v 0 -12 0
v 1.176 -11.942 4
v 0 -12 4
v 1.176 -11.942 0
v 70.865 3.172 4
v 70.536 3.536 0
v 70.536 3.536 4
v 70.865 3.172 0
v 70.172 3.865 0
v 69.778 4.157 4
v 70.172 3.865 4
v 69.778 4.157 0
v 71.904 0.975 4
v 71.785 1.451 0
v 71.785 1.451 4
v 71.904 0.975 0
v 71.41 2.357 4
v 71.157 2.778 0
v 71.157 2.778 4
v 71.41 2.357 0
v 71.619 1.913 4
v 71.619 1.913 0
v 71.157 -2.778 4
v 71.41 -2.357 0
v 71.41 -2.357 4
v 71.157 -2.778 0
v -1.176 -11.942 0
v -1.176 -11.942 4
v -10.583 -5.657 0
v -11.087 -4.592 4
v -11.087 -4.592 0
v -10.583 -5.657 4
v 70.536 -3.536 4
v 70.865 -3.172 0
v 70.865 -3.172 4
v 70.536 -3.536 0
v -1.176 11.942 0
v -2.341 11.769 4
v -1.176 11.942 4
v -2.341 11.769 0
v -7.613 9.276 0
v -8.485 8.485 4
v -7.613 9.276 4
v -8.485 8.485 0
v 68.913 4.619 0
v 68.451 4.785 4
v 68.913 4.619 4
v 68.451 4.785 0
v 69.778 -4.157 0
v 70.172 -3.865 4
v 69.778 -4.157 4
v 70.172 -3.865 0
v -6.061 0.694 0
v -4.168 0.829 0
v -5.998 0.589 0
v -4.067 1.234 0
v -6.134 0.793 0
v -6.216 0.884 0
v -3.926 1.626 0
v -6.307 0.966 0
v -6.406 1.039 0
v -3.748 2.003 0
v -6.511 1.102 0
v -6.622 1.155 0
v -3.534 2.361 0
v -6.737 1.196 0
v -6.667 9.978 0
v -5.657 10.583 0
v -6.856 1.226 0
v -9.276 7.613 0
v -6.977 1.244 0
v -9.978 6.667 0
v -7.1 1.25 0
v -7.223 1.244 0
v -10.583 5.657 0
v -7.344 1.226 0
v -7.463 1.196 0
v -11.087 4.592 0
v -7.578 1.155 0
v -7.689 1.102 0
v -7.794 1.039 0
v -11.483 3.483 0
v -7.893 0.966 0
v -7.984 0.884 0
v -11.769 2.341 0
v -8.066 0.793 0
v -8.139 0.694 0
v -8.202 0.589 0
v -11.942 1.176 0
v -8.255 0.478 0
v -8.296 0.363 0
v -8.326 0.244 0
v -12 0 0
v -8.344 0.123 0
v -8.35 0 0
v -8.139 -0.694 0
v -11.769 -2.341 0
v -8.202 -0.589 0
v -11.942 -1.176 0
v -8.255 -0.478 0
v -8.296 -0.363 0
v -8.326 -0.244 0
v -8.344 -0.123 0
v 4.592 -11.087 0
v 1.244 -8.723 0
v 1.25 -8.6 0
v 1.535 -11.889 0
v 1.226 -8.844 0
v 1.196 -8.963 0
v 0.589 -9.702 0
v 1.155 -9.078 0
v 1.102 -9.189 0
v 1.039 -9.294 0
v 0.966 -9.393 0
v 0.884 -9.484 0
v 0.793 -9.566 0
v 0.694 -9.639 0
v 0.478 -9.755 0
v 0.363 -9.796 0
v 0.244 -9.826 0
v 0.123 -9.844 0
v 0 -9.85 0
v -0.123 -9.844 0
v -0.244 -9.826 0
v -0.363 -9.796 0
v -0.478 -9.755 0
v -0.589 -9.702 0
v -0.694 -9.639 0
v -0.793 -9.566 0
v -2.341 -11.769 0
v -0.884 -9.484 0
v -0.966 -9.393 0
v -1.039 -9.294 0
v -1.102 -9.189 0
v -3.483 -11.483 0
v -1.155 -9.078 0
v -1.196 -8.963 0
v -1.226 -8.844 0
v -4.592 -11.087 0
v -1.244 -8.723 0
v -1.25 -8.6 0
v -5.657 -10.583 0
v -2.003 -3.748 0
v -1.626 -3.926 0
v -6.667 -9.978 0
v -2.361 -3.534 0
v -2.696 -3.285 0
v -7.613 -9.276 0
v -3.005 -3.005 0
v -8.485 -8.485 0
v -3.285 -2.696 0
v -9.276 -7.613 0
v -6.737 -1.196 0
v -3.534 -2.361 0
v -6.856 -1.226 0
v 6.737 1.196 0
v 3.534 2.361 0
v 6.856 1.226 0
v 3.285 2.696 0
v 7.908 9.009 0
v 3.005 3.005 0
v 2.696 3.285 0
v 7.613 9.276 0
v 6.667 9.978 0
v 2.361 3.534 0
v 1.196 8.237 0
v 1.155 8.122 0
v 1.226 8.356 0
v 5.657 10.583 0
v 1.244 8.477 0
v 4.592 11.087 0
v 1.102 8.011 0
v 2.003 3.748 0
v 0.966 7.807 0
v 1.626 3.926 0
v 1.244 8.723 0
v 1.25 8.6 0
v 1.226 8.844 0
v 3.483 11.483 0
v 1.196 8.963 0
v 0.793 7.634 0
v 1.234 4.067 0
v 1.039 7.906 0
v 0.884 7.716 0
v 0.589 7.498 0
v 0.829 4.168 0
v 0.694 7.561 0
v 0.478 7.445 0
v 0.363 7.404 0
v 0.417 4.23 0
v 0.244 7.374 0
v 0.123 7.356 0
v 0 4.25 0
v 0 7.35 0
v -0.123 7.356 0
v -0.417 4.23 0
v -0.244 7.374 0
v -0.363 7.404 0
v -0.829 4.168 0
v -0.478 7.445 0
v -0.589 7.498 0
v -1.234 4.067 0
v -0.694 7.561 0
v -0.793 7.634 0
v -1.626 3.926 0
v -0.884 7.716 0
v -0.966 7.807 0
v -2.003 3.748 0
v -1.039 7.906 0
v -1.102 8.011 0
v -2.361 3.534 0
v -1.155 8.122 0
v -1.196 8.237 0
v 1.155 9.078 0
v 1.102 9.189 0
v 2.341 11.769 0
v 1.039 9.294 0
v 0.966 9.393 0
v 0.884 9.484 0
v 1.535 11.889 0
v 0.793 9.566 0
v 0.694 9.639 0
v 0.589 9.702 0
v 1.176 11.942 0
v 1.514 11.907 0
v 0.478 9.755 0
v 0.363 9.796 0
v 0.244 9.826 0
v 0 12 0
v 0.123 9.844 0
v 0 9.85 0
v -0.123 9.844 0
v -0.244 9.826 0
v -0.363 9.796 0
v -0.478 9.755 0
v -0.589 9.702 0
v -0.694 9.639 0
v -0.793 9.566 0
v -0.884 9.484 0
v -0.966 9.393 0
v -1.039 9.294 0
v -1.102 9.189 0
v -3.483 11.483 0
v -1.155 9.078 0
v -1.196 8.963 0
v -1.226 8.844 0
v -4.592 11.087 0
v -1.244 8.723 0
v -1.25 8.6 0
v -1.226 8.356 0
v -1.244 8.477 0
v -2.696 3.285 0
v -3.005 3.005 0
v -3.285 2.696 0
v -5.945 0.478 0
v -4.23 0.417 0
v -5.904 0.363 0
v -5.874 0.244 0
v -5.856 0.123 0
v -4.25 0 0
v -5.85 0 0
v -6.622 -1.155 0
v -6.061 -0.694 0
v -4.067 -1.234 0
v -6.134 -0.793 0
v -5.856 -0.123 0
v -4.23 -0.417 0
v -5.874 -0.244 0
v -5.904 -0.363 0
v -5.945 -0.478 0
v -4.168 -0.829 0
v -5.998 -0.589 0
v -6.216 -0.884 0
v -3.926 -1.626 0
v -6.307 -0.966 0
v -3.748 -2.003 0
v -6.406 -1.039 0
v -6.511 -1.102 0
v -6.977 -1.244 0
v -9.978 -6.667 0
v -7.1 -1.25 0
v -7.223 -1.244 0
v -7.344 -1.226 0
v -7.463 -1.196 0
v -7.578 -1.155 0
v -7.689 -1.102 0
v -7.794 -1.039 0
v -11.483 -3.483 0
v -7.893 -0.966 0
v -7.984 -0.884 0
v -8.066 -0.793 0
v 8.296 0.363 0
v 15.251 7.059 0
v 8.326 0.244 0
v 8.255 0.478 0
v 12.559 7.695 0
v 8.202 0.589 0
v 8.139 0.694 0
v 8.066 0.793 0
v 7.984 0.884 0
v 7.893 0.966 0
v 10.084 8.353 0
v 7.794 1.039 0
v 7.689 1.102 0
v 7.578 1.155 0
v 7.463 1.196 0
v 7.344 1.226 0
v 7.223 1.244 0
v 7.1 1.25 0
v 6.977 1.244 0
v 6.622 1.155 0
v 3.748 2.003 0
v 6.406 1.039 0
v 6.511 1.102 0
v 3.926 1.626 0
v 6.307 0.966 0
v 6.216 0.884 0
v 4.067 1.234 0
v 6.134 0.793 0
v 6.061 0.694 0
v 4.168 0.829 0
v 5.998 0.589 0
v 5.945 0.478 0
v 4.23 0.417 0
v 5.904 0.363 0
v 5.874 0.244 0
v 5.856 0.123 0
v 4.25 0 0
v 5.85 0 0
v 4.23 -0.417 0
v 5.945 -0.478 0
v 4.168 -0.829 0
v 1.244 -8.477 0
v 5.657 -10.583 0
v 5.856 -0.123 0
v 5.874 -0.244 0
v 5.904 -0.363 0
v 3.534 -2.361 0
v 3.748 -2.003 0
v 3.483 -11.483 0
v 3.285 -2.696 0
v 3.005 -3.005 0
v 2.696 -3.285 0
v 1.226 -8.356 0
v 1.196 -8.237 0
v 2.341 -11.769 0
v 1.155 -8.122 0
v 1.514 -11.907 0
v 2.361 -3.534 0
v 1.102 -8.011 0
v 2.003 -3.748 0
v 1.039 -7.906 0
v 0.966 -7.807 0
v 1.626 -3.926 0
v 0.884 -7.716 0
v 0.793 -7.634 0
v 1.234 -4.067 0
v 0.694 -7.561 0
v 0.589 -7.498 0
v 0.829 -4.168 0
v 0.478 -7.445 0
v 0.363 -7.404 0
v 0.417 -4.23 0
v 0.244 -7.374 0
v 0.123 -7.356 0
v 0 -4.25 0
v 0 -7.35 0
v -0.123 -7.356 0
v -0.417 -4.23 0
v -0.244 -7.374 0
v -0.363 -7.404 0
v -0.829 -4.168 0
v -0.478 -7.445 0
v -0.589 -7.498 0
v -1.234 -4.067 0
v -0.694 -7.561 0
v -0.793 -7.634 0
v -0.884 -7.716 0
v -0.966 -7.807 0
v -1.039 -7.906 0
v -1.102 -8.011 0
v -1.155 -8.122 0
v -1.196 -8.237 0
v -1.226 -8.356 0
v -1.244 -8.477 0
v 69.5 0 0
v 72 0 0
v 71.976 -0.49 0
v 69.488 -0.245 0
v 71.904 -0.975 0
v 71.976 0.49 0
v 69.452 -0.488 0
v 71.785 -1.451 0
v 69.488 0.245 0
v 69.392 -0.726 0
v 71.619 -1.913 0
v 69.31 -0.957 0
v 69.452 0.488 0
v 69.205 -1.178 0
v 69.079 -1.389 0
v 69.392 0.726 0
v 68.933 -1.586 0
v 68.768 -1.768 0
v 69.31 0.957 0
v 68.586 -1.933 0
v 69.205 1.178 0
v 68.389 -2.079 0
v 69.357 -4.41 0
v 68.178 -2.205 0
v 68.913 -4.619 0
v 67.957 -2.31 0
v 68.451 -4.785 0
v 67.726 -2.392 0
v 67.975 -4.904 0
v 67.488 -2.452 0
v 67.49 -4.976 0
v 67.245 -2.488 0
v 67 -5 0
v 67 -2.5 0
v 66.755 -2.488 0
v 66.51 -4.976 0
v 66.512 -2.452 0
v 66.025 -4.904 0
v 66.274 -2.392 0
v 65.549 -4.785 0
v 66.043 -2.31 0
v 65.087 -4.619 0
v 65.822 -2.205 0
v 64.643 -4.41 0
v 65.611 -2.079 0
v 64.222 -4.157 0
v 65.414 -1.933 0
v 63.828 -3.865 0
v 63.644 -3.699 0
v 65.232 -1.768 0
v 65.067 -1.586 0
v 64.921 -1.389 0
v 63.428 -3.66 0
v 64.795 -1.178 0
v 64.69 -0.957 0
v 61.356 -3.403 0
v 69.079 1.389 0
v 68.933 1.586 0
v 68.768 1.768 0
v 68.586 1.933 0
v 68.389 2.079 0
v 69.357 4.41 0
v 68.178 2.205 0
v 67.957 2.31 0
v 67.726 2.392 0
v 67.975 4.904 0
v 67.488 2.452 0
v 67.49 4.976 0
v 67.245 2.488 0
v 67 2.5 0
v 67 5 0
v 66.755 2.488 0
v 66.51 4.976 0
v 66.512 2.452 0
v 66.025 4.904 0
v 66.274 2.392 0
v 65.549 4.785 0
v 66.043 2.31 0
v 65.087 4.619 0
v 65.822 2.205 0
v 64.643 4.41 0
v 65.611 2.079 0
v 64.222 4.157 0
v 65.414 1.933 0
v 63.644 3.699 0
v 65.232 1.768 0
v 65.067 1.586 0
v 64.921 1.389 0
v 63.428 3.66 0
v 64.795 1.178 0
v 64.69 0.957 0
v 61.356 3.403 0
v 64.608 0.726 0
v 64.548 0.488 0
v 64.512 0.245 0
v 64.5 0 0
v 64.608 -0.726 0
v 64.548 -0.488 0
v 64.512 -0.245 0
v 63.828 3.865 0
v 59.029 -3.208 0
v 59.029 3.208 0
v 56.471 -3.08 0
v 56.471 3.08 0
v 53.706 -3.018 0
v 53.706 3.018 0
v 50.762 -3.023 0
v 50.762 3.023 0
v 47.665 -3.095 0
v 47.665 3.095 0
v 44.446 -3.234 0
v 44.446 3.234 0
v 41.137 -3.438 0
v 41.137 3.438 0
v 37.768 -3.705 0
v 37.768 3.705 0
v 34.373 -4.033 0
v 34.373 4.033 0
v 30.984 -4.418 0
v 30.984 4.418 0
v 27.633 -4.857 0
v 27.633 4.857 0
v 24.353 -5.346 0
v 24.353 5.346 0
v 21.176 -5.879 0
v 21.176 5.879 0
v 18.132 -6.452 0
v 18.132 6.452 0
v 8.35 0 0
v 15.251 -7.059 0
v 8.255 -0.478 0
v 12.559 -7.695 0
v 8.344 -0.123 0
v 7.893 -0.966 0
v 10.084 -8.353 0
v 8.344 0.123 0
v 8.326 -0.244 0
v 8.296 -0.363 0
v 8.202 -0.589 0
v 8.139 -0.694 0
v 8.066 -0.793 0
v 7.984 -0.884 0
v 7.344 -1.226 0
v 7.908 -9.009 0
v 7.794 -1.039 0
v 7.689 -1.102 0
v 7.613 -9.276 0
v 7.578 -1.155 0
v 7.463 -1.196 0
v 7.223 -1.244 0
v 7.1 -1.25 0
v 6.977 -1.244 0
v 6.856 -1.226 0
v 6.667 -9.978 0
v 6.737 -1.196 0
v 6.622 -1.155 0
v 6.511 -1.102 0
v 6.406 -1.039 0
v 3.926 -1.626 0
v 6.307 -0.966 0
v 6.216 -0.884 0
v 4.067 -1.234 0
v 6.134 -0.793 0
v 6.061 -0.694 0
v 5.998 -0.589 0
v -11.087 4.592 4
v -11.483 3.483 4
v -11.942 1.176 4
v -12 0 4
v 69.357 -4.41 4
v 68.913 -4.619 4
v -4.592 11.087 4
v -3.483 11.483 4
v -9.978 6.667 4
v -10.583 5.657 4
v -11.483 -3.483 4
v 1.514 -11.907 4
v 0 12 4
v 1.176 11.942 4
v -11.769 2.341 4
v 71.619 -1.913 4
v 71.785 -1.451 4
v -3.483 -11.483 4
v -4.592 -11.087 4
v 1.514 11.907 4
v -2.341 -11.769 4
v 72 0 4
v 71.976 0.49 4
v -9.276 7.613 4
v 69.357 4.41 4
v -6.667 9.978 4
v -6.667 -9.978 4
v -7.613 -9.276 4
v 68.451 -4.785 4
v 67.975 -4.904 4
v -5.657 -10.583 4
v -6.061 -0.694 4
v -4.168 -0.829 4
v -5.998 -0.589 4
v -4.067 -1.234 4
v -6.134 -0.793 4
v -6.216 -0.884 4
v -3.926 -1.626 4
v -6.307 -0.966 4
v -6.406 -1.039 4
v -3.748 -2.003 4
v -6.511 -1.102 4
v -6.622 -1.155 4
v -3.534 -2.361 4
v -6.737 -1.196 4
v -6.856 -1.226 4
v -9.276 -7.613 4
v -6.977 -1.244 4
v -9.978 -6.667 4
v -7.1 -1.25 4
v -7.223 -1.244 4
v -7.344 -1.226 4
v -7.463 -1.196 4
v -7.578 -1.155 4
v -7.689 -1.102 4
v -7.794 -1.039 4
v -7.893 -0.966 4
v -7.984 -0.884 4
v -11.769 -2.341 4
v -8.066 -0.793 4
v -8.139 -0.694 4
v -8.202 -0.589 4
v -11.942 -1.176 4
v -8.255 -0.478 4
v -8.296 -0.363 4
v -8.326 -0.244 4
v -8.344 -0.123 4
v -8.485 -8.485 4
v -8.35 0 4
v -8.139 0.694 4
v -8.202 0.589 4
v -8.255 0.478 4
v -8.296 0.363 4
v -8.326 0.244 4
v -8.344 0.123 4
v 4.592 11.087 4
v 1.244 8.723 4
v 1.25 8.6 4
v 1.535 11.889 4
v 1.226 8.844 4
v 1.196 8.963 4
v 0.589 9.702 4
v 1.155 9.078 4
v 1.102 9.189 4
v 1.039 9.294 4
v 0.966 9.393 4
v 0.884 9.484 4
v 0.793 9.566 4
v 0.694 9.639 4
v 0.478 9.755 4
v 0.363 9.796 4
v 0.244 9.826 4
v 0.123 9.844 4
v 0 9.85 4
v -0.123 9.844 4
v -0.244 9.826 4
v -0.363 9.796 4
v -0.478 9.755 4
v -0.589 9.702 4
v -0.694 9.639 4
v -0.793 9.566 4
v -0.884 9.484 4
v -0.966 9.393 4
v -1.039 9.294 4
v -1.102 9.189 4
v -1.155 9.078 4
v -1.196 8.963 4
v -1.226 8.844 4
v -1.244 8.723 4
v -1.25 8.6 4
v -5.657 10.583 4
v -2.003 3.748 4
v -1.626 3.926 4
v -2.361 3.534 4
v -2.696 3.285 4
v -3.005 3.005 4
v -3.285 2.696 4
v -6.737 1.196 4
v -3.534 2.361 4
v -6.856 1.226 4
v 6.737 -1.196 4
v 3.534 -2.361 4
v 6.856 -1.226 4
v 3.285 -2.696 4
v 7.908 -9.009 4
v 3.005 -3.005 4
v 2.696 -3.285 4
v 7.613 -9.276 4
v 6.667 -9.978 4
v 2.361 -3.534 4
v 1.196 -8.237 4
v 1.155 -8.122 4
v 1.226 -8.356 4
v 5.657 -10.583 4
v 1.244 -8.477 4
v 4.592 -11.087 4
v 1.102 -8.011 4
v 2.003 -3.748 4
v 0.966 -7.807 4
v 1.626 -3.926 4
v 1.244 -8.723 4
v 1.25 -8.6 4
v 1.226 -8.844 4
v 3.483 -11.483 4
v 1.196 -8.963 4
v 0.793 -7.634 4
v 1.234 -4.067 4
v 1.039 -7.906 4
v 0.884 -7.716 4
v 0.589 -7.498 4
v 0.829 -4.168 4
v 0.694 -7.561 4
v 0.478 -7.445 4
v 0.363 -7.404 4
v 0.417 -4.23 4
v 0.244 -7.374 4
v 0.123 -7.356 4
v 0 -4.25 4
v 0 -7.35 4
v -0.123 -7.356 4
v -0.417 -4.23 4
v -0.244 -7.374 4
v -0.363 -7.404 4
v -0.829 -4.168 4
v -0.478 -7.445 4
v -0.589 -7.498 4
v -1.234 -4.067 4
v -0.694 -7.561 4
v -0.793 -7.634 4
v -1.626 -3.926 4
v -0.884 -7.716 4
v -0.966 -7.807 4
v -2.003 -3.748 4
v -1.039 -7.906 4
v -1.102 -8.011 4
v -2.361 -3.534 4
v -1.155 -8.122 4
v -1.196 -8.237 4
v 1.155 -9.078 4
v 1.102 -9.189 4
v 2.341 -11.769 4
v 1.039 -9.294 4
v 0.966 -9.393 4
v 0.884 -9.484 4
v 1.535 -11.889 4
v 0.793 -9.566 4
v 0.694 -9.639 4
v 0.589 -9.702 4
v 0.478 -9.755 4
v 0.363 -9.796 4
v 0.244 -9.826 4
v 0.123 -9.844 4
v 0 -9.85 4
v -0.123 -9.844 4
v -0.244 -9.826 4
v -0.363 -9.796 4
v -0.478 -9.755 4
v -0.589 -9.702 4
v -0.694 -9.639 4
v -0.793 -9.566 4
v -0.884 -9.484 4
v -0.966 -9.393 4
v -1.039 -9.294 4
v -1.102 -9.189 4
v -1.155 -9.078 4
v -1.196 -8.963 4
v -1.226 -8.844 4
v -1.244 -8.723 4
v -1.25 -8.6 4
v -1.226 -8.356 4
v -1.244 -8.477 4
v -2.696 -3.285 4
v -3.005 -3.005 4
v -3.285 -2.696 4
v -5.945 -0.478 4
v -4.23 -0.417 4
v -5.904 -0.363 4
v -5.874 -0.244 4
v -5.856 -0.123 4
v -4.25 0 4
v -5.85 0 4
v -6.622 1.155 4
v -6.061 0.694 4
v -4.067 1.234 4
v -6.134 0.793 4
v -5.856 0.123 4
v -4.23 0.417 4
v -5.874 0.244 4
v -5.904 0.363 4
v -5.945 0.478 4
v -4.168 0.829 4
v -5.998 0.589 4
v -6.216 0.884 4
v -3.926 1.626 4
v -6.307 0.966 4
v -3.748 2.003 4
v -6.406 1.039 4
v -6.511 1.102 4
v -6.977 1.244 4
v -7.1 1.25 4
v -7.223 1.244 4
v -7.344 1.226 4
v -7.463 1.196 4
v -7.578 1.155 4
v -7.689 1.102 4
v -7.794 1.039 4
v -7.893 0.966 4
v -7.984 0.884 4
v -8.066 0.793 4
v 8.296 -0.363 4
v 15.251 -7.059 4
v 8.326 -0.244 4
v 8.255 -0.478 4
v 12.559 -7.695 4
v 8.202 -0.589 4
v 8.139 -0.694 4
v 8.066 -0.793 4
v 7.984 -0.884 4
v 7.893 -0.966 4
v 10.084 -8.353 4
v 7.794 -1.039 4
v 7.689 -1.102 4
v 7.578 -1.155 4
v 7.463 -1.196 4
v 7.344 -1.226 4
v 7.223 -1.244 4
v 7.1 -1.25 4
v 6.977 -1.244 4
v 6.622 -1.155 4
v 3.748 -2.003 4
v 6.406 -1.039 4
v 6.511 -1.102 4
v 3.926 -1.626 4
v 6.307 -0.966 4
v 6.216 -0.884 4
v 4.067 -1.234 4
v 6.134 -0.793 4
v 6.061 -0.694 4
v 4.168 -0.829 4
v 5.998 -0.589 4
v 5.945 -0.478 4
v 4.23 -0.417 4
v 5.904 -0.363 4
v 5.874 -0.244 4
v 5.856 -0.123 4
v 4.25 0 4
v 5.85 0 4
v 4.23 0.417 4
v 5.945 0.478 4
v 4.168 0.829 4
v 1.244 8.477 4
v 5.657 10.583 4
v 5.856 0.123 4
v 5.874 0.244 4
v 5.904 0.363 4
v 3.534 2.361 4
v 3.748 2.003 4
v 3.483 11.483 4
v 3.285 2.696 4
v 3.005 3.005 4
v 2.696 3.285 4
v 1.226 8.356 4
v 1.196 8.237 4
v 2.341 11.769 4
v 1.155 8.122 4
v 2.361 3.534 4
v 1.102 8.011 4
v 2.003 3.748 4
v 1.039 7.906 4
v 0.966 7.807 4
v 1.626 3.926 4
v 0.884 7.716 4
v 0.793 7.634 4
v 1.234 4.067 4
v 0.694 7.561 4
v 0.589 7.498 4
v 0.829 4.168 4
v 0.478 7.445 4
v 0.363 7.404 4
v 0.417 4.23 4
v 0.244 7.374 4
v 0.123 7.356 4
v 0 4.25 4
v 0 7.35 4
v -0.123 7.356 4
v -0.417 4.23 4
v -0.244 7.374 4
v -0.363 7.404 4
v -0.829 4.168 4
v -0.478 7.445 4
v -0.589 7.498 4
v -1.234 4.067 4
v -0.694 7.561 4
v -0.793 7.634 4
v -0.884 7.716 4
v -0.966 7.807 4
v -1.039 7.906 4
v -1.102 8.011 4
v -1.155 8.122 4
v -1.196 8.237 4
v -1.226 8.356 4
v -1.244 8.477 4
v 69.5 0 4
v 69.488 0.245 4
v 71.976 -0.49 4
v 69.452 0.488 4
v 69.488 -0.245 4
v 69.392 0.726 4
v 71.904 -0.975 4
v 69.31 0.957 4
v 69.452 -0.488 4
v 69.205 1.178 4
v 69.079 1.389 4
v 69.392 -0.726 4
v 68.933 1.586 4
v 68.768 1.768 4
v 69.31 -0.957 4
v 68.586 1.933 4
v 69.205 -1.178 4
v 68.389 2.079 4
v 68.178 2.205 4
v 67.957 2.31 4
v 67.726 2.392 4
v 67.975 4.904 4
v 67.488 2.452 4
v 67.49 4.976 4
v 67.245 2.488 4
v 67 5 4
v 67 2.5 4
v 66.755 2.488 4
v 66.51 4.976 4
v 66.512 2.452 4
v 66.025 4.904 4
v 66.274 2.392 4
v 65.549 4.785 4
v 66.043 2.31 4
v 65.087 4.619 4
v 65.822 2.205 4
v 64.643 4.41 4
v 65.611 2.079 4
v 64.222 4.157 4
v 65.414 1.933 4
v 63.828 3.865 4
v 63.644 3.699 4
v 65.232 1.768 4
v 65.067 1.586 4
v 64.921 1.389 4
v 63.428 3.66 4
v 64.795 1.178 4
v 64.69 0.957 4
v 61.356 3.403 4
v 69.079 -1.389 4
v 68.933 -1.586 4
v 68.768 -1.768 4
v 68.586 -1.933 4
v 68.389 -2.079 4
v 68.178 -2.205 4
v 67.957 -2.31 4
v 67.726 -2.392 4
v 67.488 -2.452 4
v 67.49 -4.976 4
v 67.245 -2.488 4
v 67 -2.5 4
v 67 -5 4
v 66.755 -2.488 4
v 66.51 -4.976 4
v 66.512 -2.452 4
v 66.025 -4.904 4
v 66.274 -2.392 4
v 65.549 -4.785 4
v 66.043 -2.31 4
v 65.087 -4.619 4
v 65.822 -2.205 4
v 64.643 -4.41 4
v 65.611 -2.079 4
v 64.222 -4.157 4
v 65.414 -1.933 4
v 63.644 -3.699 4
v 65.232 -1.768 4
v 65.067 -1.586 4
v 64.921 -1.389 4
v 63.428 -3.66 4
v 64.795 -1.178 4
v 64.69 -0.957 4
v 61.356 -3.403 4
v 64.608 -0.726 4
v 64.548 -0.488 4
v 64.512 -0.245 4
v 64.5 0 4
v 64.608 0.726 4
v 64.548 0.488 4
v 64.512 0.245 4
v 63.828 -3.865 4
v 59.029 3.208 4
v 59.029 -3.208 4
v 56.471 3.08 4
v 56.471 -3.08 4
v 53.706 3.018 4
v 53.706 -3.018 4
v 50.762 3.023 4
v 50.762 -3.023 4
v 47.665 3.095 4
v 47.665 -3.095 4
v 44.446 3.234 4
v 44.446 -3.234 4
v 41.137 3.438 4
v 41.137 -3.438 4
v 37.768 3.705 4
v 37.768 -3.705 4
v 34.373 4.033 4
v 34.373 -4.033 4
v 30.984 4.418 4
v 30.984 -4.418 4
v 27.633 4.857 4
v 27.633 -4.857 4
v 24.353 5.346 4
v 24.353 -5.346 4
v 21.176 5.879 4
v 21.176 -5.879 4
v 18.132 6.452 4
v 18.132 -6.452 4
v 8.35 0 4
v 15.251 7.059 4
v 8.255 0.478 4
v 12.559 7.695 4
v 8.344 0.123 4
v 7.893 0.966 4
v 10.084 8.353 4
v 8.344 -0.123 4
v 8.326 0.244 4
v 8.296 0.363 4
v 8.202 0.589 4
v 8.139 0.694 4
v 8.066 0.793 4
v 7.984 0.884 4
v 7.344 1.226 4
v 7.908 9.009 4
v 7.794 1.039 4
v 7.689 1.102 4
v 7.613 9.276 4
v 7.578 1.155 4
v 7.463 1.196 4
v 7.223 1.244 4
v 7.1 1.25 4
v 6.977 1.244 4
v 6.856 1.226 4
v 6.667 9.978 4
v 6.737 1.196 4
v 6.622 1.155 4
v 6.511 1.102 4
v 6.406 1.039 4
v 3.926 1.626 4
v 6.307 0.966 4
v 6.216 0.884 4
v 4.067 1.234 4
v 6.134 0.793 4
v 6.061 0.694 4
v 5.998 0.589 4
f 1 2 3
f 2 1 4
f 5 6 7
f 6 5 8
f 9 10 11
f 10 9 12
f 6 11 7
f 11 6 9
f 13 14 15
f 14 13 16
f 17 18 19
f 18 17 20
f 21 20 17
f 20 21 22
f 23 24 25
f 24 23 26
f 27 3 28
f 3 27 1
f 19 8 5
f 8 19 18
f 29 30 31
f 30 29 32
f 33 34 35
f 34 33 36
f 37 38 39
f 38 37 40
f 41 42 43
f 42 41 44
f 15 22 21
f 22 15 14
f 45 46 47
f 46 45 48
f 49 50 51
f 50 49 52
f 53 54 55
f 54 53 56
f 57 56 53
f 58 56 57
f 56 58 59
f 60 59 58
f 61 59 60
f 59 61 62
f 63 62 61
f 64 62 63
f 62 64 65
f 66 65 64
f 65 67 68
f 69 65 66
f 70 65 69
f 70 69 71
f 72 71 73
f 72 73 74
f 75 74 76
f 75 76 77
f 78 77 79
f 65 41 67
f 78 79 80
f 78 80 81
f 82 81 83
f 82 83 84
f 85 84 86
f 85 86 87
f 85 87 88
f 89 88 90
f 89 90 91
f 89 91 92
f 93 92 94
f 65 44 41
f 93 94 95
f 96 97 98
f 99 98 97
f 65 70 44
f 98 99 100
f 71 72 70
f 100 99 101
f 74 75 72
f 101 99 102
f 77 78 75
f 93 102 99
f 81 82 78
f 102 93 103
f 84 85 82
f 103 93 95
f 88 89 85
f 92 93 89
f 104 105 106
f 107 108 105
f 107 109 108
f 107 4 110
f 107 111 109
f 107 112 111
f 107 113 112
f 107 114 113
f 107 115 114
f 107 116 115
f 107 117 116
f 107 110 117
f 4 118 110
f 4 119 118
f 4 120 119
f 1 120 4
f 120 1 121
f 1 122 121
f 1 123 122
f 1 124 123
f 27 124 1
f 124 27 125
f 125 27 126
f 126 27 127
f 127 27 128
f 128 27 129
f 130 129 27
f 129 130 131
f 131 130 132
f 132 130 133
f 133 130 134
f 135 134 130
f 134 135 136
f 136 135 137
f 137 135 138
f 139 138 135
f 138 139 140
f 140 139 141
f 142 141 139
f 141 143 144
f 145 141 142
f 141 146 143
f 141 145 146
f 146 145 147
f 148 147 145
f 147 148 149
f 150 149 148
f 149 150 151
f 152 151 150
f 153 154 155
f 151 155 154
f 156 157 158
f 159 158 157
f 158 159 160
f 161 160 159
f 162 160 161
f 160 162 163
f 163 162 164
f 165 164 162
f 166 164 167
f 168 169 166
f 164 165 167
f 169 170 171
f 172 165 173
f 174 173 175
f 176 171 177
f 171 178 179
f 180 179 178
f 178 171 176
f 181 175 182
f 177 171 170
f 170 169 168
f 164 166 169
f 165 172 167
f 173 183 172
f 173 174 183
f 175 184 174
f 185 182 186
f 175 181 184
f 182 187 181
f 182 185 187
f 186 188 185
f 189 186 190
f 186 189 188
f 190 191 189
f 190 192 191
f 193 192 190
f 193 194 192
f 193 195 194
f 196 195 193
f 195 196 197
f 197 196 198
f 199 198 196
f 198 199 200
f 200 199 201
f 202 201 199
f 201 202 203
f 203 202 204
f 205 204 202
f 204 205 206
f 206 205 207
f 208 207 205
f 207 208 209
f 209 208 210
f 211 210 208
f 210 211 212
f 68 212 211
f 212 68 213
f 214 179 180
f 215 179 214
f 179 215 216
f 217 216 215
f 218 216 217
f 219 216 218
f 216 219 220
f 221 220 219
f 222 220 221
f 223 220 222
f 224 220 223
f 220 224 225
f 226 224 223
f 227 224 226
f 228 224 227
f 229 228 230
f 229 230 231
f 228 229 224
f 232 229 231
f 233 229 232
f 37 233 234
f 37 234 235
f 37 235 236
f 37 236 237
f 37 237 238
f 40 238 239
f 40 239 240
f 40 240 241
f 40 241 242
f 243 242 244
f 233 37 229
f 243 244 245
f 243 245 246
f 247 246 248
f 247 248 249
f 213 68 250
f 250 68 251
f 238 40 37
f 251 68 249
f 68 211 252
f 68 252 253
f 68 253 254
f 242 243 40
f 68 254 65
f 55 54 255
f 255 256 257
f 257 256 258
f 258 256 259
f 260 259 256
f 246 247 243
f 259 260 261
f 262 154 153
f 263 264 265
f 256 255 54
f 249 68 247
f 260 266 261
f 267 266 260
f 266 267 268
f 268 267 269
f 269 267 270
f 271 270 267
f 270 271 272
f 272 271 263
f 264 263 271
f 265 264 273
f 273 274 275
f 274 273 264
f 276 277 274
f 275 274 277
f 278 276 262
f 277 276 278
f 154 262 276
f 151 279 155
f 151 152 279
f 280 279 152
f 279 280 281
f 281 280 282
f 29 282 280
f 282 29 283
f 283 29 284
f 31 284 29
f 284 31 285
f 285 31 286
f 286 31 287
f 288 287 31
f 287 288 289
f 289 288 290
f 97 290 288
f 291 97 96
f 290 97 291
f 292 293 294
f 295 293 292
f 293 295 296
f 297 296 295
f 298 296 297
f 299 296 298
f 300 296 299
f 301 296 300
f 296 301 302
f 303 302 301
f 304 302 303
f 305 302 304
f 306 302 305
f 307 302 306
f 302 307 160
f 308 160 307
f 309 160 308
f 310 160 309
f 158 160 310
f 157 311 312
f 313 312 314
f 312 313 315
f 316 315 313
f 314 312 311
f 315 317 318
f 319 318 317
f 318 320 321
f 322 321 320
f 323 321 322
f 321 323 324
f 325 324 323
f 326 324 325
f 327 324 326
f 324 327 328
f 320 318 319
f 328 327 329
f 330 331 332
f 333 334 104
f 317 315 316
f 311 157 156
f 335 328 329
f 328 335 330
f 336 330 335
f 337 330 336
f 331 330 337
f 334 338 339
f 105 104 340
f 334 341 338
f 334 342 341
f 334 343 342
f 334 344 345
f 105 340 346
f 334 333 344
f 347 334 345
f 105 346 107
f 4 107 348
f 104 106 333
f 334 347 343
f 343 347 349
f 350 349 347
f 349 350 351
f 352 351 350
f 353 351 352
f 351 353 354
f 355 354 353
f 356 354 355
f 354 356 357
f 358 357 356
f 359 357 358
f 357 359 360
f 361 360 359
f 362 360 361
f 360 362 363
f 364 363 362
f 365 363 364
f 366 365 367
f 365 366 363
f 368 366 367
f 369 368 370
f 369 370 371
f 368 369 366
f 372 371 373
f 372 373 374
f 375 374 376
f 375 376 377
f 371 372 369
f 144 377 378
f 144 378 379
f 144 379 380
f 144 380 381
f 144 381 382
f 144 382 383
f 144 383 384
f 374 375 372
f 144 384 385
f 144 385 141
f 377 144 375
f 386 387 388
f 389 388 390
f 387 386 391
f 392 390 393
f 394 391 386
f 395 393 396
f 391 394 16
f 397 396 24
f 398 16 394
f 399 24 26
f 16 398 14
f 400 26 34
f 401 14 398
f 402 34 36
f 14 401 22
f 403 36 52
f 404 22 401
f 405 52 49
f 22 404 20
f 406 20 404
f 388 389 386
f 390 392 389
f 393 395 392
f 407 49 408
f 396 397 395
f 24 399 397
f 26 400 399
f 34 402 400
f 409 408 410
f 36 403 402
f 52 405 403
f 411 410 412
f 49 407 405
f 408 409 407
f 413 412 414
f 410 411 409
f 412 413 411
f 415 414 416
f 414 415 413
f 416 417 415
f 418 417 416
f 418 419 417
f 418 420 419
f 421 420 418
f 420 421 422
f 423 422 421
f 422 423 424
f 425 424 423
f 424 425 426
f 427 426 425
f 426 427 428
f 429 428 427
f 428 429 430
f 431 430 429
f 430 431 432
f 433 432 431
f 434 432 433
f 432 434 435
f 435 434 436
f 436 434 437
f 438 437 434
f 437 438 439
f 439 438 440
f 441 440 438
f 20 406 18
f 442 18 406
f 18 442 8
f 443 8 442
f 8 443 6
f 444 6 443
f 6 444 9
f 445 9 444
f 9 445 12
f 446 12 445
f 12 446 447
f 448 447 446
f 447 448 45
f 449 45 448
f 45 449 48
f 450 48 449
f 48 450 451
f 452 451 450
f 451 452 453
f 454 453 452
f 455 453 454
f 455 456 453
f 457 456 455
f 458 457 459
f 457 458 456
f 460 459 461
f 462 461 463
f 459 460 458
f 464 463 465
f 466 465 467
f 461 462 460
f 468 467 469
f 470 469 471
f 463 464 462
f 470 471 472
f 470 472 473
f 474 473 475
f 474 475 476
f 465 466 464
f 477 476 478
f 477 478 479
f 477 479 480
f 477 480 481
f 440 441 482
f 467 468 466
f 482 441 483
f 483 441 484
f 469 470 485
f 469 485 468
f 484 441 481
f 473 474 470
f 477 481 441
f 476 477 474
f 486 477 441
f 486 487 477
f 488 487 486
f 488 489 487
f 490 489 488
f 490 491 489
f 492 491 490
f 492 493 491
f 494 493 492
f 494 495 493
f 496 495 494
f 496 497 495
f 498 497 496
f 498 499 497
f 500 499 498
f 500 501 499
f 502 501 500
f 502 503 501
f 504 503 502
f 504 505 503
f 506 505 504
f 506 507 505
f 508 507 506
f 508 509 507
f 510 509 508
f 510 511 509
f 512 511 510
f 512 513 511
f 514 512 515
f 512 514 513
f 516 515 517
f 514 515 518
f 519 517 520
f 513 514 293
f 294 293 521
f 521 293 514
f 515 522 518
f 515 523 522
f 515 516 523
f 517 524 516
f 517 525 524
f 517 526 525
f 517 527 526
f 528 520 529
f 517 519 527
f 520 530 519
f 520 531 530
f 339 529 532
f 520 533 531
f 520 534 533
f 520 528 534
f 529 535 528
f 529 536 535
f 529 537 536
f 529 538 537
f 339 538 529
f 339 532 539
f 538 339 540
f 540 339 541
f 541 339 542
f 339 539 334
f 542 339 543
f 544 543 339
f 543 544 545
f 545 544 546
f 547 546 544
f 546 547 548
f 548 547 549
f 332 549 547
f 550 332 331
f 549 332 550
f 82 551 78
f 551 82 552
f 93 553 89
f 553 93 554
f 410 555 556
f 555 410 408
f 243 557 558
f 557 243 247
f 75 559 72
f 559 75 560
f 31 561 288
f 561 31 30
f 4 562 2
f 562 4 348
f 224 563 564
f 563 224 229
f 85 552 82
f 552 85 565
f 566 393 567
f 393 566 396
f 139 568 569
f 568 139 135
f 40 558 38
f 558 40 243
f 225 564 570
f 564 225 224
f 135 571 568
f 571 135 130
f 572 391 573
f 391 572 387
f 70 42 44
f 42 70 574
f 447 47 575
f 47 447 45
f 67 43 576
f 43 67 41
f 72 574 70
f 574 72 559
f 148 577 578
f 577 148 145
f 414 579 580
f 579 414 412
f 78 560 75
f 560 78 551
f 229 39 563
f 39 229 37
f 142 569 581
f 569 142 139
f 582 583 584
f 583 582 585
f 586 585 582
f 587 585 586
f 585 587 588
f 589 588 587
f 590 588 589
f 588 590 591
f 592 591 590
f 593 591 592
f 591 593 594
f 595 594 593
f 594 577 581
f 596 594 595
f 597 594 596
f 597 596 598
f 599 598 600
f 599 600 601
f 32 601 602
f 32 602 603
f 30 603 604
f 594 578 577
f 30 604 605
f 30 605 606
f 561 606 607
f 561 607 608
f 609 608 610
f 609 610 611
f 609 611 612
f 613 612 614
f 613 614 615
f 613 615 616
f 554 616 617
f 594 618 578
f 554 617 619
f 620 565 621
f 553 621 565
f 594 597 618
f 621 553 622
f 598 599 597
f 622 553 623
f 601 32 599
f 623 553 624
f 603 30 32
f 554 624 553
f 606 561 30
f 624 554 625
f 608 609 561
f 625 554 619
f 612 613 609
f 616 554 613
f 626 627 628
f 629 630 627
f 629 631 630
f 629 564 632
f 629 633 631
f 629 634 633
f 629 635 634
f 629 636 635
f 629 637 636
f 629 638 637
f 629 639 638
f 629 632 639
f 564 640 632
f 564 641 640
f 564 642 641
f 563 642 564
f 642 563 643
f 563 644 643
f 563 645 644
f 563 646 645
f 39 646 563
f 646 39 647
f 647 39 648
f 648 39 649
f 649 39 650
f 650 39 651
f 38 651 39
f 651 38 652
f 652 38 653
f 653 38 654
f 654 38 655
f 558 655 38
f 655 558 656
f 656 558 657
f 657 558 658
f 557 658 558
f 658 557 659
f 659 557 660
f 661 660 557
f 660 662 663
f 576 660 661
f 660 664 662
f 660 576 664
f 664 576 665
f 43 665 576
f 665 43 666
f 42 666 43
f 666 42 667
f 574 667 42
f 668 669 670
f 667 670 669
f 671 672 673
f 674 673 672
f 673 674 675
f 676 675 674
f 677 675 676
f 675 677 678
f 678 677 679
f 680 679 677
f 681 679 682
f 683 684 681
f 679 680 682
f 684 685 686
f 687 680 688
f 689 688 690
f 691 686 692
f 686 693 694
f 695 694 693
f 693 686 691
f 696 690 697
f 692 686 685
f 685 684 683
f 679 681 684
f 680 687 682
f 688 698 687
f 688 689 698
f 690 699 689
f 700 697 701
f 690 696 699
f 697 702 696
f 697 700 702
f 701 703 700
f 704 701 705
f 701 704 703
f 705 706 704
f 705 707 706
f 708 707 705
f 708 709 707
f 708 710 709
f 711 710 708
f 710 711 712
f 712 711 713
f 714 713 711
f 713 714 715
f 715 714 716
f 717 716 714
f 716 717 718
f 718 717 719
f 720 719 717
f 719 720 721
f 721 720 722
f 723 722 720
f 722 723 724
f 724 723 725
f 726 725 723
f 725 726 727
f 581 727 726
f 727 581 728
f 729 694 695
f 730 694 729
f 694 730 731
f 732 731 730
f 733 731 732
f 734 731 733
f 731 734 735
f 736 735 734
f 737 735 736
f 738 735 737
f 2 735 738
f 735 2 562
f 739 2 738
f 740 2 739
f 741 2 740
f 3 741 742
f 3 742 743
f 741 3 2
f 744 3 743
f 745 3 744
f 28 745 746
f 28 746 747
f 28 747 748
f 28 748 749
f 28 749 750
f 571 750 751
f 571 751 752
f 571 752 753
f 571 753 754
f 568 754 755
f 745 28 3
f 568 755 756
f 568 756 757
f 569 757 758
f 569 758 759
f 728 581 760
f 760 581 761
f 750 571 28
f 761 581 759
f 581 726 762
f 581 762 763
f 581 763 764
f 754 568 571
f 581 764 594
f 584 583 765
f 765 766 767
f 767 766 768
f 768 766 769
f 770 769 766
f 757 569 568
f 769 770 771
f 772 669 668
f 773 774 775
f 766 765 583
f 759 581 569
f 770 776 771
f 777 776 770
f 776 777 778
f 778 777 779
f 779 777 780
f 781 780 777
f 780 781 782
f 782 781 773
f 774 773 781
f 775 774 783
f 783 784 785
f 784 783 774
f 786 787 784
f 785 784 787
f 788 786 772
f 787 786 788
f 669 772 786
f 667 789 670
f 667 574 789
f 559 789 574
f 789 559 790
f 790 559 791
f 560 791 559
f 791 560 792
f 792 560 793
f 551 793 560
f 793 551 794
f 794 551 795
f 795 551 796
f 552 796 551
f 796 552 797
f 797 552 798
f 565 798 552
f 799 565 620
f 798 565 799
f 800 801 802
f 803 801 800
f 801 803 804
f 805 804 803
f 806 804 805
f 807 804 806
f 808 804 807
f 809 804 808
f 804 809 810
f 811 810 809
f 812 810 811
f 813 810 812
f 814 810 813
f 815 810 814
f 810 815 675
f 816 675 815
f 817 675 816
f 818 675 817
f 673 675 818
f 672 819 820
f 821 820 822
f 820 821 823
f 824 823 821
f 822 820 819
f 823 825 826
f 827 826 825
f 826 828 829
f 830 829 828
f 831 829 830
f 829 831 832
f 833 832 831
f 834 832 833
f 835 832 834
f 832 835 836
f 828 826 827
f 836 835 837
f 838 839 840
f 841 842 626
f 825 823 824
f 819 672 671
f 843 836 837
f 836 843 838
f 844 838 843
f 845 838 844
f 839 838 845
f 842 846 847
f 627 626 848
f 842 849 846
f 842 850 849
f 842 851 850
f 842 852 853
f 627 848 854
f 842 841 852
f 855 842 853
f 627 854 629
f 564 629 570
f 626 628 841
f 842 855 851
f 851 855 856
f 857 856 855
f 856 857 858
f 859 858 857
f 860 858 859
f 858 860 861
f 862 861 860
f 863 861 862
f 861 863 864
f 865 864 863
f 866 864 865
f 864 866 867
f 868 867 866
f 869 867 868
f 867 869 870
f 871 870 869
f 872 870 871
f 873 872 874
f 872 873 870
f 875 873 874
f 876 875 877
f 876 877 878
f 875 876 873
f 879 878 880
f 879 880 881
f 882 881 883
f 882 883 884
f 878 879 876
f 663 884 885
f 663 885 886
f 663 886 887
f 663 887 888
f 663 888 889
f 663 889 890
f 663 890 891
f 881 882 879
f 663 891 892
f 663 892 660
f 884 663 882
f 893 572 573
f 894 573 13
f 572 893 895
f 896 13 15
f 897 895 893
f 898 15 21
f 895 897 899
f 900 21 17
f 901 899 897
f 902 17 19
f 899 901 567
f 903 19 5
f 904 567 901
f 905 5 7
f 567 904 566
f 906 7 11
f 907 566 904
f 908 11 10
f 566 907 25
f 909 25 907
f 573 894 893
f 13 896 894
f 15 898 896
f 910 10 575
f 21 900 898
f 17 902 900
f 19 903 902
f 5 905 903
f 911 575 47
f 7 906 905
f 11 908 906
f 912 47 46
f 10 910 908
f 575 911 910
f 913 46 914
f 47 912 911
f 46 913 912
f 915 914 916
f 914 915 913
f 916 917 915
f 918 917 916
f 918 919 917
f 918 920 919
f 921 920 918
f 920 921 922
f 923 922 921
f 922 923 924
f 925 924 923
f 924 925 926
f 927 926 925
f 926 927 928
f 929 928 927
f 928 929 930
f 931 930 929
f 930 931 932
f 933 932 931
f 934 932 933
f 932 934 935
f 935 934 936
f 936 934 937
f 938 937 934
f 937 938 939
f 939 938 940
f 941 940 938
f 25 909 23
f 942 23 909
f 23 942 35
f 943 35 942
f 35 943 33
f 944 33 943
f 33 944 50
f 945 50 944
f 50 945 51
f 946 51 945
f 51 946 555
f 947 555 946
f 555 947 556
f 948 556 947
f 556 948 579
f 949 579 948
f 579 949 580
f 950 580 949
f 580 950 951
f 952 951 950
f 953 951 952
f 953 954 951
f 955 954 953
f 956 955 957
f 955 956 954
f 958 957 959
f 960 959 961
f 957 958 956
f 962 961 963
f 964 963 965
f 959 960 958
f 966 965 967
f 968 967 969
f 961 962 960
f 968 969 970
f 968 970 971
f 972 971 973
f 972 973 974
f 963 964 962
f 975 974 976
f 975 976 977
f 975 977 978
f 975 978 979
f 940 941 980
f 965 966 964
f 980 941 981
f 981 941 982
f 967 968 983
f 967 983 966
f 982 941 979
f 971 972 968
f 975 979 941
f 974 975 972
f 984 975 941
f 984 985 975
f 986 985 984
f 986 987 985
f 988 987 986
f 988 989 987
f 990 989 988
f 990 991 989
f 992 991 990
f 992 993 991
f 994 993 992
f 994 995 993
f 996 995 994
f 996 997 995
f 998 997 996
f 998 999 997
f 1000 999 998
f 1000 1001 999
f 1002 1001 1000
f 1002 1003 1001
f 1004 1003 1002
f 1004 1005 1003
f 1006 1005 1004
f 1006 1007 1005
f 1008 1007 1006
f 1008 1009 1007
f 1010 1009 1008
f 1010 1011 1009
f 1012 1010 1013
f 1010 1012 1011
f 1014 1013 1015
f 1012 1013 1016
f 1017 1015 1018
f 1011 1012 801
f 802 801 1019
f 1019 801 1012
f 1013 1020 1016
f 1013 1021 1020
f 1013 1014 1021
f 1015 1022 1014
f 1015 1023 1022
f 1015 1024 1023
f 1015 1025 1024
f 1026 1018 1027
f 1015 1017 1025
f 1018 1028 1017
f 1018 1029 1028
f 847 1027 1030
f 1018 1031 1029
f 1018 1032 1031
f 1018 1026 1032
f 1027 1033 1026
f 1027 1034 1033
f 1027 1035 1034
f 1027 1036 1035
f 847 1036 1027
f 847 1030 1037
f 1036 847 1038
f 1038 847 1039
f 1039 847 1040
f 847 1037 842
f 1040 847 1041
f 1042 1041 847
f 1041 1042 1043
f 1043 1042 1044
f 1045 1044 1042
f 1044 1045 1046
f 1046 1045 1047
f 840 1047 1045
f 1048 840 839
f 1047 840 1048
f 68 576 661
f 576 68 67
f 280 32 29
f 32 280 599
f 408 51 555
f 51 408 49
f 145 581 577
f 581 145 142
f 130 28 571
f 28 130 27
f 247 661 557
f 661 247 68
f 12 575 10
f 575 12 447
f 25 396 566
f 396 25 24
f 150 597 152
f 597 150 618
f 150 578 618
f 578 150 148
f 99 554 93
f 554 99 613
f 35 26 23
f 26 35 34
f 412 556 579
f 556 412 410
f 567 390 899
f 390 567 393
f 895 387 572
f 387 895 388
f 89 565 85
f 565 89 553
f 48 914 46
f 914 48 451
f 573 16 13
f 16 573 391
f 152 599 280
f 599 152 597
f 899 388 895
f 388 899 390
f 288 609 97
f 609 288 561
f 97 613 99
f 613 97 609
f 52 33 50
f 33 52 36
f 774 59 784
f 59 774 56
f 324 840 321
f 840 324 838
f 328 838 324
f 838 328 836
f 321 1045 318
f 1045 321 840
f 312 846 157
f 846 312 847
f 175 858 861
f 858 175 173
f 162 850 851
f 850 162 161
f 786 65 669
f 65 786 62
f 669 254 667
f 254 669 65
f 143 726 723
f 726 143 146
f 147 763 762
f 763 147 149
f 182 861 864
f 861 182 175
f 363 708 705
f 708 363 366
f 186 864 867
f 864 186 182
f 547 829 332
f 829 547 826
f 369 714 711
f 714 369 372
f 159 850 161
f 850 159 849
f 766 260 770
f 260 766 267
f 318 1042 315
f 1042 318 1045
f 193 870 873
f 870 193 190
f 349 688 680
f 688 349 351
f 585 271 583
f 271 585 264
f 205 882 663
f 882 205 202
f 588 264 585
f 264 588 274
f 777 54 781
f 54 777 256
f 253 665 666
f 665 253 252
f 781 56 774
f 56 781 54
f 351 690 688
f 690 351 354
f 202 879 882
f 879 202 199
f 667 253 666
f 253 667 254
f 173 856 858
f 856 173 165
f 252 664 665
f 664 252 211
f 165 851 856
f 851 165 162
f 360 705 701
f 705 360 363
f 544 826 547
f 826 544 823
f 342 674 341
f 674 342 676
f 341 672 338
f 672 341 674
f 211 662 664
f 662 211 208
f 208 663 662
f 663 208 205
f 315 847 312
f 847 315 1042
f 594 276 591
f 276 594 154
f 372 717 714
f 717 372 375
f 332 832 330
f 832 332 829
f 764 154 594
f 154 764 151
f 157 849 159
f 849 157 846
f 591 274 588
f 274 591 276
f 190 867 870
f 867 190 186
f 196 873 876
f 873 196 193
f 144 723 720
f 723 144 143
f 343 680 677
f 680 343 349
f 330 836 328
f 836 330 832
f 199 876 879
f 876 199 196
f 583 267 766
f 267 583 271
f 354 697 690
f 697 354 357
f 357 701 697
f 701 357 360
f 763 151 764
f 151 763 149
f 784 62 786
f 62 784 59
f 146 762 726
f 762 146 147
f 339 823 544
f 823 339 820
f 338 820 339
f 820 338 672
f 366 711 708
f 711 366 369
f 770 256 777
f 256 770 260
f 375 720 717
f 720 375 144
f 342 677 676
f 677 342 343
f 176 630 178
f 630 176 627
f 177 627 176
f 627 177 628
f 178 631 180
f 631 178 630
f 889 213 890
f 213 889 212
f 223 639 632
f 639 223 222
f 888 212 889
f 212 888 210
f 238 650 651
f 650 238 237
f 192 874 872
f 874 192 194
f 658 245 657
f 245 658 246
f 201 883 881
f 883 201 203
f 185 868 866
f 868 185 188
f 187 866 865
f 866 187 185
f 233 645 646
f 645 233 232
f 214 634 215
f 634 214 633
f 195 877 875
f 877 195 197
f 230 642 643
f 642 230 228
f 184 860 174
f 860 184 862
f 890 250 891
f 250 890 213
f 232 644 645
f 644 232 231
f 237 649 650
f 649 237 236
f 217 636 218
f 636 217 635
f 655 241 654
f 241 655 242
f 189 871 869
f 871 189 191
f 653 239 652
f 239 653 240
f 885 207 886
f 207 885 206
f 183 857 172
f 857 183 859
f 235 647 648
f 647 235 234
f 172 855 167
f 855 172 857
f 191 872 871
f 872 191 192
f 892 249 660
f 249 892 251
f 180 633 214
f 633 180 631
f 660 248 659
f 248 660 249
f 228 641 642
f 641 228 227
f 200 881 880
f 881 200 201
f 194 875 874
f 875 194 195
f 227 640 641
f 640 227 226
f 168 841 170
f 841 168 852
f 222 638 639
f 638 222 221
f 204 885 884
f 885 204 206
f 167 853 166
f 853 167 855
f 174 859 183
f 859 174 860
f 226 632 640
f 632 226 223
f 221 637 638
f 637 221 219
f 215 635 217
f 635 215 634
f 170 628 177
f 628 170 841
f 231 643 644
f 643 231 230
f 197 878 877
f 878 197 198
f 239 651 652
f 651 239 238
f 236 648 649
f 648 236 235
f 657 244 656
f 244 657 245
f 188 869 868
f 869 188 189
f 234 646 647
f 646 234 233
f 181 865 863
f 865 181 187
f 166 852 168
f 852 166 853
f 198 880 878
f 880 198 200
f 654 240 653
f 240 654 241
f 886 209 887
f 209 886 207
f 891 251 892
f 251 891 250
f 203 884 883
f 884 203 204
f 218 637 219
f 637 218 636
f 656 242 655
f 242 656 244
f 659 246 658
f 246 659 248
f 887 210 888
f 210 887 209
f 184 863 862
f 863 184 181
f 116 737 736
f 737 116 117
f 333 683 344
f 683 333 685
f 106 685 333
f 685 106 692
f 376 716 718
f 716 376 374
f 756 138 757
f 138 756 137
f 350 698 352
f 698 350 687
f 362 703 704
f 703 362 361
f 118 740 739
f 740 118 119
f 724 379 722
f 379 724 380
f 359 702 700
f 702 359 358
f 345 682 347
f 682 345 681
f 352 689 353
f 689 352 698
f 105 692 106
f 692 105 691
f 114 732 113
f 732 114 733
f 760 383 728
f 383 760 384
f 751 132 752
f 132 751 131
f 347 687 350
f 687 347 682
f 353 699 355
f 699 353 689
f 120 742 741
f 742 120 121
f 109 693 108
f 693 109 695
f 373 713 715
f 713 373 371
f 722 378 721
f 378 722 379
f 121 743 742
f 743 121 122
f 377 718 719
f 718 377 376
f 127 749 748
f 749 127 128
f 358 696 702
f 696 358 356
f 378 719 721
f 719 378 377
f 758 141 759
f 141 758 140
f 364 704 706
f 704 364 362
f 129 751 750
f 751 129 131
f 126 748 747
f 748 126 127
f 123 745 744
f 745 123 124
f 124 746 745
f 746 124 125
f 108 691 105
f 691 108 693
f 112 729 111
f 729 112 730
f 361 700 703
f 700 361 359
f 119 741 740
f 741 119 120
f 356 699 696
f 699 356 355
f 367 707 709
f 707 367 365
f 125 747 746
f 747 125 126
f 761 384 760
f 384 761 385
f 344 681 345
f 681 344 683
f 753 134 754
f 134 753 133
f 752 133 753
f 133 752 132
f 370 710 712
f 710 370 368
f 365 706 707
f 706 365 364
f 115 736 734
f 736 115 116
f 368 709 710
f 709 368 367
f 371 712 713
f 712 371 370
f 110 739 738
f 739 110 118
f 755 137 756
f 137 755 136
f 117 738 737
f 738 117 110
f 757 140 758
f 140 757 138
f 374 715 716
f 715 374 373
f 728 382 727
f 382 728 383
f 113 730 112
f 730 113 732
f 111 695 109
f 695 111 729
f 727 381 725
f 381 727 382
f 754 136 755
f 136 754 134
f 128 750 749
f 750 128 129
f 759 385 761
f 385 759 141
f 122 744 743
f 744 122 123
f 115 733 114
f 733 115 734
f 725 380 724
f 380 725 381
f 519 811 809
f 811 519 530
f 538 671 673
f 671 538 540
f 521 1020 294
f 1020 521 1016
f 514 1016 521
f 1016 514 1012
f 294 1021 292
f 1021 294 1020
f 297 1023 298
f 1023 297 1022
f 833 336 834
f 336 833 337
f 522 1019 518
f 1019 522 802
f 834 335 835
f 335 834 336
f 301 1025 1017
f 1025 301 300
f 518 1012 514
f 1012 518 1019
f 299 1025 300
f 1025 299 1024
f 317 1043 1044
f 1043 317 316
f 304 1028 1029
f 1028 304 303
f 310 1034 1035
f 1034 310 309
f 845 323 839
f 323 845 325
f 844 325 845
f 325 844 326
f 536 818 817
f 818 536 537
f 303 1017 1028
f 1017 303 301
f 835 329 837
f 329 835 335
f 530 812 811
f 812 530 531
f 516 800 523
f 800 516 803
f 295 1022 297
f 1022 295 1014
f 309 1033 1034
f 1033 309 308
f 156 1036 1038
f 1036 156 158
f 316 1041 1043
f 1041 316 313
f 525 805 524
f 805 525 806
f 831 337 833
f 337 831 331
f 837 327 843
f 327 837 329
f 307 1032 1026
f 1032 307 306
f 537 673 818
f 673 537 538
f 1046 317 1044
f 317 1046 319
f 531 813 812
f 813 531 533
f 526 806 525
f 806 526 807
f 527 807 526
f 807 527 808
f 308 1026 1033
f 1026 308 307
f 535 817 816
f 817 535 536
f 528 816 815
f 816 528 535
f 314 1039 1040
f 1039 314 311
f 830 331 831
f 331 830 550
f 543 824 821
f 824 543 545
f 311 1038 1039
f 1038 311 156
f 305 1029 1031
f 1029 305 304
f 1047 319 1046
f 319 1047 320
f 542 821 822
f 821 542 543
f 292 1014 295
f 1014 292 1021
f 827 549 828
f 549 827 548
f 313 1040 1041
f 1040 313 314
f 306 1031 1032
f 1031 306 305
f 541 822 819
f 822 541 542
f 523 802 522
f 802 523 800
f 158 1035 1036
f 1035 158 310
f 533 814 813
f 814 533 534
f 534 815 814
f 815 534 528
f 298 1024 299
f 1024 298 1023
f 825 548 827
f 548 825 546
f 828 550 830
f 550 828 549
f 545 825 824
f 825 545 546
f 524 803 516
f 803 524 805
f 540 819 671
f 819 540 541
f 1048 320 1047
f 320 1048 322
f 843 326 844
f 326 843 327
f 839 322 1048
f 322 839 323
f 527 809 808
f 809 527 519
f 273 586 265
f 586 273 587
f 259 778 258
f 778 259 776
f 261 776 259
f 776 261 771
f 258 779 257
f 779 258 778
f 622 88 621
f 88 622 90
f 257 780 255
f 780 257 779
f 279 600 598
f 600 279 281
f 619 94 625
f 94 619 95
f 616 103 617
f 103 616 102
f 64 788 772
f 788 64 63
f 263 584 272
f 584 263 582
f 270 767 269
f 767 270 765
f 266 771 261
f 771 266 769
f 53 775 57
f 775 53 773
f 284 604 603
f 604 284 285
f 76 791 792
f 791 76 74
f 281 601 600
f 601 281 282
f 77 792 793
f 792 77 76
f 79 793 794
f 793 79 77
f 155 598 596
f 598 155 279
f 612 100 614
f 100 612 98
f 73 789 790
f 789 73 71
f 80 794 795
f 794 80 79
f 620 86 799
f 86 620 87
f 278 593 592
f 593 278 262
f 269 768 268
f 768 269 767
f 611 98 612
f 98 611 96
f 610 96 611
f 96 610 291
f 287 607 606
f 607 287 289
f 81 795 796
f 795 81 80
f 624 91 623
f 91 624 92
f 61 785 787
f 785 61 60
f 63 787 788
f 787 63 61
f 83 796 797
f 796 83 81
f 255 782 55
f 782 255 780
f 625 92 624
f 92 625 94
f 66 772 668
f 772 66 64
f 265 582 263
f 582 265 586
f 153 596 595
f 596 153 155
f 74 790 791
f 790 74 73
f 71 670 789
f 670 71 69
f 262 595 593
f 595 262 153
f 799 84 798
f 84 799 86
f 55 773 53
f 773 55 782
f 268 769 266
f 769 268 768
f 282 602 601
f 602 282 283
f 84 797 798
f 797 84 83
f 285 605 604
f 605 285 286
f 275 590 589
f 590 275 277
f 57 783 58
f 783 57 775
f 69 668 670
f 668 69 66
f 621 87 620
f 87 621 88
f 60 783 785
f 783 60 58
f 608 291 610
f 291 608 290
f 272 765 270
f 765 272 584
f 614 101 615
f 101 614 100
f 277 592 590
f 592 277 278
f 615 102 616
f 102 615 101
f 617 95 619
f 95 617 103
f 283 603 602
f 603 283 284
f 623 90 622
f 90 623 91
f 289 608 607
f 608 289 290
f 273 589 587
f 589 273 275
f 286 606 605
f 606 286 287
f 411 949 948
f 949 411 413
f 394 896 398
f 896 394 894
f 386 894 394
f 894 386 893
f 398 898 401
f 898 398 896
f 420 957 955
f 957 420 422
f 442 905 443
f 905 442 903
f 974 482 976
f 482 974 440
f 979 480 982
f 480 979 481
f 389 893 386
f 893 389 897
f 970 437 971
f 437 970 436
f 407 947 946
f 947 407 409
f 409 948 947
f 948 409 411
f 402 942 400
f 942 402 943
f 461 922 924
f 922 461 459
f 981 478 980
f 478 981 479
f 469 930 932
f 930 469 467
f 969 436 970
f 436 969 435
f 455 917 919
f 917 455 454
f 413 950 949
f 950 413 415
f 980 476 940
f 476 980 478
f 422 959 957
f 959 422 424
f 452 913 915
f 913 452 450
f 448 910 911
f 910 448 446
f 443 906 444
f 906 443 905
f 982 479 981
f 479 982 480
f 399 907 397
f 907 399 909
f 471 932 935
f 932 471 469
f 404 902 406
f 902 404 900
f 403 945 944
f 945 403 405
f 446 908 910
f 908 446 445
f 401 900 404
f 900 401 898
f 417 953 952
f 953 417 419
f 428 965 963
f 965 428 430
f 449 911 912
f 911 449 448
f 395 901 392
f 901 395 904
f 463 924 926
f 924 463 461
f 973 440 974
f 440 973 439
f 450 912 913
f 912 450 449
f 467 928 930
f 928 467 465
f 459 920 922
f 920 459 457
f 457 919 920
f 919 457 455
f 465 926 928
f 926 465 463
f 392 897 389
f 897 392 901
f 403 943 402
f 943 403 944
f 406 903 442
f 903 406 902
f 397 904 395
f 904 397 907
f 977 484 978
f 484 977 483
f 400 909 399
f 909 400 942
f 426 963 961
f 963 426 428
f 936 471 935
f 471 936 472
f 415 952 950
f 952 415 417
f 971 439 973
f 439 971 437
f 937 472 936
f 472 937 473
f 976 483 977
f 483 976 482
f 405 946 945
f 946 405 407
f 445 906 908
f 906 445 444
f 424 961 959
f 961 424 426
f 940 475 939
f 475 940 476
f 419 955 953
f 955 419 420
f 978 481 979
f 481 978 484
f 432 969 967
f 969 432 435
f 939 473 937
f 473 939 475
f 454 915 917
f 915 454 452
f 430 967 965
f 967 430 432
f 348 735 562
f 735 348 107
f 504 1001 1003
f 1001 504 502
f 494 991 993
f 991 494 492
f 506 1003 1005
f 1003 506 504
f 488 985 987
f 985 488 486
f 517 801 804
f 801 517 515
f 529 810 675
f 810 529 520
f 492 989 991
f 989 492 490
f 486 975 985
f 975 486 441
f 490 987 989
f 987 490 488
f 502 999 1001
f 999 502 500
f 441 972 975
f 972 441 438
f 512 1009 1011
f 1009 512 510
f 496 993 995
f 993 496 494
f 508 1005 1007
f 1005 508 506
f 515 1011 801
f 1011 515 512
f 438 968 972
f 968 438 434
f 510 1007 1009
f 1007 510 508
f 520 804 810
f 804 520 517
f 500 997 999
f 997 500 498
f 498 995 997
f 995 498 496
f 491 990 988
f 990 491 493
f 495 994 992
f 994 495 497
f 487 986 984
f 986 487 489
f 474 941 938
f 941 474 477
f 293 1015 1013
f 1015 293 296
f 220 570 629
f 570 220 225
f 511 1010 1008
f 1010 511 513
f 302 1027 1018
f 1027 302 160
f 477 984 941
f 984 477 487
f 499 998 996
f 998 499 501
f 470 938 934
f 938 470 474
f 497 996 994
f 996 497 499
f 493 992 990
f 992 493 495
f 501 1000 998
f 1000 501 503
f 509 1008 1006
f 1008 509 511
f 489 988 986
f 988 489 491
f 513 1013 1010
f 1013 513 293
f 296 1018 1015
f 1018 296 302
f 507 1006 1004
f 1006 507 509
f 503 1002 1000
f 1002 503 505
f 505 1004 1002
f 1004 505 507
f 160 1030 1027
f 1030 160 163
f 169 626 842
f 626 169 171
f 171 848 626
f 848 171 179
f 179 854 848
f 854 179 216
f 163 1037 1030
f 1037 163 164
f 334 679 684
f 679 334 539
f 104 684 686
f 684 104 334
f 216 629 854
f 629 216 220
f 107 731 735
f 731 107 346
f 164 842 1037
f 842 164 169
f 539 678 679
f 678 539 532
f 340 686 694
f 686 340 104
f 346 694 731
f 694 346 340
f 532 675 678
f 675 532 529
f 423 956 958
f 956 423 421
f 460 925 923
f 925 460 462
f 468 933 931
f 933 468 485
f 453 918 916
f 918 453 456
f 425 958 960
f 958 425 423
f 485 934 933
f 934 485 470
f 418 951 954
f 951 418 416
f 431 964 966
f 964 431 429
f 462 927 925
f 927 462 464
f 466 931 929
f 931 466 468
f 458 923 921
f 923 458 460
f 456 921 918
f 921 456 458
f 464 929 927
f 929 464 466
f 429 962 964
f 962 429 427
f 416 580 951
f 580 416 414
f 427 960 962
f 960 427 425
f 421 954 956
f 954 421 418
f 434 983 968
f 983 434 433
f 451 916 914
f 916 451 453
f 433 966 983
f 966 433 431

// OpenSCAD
$fn=64;

difference(){ 
  //main body 
  hull(){  
    cylinder(4,d=24,d=24);
    translate([67,0,0])
      cylinder(4,d=10,d=10);
  }
  //spline hole
  translate([0,0,-1])
    cylinder(6,d=8.5,d=8.5);
  //4 horn holes
  translate([0,8.6,-1])
    cylinder(6,d=2.5,d=2.5);
  translate([0,-8.6,-1])
    cylinder(6,d=2.5,d=2.5);
  translate([7.1,0,-1])
    cylinder(6,d=2.5,d=2.5);
  translate([-7.1,0,-1])
    cylinder(6,d=2.5,d=2.5);
  //passive hole
  translate([67,0,-1])
    cylinder(6,d=5,d=5);
  //contours
  translate([35,-10,-1])
    rotate([0,0,6])
      scale([5.8,1,1])
        cylinder(6,d=12,d=12);
  translate([35,10,-1])
    rotate([0,0,-6])
      scale([5.8,1,1])
        cylinder(6,d=12,d=12);
}
//overlay horn cylinder to maintan
//shape
difference(){
cylinder(4,d=24,d=24);
//spline hole
translate([0,0,-1])    
  cylinder(6,d=8.5,d=8.5);
//4 horn holes
translate([0,8.6,-1])
  cylinder(6,d=2.5,d=2.5);
translate([0,-8.6,-1])
  cylinder(6,d=2.5,d=2.5);
translate([7.1,0,-1])
  cylinder(6,d=2.5,d=2.5);
translate([-7.1,0,-1])
  cylinder(6,d=2.5,d=2.5);
}
//overlay passive cylinder to maintain
//shape
difference(){
  translate([67,0,0])
      cylinder(4,d=10,d=10);
  translate([67,0,-1])
    cylinder(6,d=5,d=5);
}
